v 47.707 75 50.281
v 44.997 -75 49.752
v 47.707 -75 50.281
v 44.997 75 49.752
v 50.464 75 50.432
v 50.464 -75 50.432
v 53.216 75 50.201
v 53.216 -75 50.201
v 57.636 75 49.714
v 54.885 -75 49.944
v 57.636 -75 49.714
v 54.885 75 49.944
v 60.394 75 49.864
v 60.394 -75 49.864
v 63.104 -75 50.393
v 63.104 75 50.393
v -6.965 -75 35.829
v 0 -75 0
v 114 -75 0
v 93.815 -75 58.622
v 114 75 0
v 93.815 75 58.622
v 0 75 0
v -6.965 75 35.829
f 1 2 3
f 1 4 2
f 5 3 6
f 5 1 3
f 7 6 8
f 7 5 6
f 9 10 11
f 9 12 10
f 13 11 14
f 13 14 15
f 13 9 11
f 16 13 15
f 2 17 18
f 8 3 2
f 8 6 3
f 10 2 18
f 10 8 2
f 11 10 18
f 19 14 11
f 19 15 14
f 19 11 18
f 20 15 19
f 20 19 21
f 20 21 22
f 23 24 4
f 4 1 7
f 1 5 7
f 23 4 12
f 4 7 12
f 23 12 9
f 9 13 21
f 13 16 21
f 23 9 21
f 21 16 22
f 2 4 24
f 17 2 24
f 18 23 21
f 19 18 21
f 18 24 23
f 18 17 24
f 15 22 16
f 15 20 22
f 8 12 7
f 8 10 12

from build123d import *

# Parameters (mm, degrees)
F1_DEPTH = 75
F2_R     = 20


with BuildPart() as f1:
    # F0 (on Front) → F1 (new body, symmetric)
    with BuildSketch(Plane.XZ):
        Polygon((-6.964528, 35.829392), (0, 0), (114, 0), (93.814774, 58.622152), (59.041445, 49.304666), (49.05917, 50.840897), align=None)
    extrude(amount=F1_DEPTH, both=True)

    # F2
    f2_edges = [f1.edges().sort_by_distance(p)[0] for p in [
        (49.05917, 0, 50.840897),
        (59.041445, 0, 49.304666),
    ]]
    fillet(f2_edges, radius=F2_R)


solid = f1.part
